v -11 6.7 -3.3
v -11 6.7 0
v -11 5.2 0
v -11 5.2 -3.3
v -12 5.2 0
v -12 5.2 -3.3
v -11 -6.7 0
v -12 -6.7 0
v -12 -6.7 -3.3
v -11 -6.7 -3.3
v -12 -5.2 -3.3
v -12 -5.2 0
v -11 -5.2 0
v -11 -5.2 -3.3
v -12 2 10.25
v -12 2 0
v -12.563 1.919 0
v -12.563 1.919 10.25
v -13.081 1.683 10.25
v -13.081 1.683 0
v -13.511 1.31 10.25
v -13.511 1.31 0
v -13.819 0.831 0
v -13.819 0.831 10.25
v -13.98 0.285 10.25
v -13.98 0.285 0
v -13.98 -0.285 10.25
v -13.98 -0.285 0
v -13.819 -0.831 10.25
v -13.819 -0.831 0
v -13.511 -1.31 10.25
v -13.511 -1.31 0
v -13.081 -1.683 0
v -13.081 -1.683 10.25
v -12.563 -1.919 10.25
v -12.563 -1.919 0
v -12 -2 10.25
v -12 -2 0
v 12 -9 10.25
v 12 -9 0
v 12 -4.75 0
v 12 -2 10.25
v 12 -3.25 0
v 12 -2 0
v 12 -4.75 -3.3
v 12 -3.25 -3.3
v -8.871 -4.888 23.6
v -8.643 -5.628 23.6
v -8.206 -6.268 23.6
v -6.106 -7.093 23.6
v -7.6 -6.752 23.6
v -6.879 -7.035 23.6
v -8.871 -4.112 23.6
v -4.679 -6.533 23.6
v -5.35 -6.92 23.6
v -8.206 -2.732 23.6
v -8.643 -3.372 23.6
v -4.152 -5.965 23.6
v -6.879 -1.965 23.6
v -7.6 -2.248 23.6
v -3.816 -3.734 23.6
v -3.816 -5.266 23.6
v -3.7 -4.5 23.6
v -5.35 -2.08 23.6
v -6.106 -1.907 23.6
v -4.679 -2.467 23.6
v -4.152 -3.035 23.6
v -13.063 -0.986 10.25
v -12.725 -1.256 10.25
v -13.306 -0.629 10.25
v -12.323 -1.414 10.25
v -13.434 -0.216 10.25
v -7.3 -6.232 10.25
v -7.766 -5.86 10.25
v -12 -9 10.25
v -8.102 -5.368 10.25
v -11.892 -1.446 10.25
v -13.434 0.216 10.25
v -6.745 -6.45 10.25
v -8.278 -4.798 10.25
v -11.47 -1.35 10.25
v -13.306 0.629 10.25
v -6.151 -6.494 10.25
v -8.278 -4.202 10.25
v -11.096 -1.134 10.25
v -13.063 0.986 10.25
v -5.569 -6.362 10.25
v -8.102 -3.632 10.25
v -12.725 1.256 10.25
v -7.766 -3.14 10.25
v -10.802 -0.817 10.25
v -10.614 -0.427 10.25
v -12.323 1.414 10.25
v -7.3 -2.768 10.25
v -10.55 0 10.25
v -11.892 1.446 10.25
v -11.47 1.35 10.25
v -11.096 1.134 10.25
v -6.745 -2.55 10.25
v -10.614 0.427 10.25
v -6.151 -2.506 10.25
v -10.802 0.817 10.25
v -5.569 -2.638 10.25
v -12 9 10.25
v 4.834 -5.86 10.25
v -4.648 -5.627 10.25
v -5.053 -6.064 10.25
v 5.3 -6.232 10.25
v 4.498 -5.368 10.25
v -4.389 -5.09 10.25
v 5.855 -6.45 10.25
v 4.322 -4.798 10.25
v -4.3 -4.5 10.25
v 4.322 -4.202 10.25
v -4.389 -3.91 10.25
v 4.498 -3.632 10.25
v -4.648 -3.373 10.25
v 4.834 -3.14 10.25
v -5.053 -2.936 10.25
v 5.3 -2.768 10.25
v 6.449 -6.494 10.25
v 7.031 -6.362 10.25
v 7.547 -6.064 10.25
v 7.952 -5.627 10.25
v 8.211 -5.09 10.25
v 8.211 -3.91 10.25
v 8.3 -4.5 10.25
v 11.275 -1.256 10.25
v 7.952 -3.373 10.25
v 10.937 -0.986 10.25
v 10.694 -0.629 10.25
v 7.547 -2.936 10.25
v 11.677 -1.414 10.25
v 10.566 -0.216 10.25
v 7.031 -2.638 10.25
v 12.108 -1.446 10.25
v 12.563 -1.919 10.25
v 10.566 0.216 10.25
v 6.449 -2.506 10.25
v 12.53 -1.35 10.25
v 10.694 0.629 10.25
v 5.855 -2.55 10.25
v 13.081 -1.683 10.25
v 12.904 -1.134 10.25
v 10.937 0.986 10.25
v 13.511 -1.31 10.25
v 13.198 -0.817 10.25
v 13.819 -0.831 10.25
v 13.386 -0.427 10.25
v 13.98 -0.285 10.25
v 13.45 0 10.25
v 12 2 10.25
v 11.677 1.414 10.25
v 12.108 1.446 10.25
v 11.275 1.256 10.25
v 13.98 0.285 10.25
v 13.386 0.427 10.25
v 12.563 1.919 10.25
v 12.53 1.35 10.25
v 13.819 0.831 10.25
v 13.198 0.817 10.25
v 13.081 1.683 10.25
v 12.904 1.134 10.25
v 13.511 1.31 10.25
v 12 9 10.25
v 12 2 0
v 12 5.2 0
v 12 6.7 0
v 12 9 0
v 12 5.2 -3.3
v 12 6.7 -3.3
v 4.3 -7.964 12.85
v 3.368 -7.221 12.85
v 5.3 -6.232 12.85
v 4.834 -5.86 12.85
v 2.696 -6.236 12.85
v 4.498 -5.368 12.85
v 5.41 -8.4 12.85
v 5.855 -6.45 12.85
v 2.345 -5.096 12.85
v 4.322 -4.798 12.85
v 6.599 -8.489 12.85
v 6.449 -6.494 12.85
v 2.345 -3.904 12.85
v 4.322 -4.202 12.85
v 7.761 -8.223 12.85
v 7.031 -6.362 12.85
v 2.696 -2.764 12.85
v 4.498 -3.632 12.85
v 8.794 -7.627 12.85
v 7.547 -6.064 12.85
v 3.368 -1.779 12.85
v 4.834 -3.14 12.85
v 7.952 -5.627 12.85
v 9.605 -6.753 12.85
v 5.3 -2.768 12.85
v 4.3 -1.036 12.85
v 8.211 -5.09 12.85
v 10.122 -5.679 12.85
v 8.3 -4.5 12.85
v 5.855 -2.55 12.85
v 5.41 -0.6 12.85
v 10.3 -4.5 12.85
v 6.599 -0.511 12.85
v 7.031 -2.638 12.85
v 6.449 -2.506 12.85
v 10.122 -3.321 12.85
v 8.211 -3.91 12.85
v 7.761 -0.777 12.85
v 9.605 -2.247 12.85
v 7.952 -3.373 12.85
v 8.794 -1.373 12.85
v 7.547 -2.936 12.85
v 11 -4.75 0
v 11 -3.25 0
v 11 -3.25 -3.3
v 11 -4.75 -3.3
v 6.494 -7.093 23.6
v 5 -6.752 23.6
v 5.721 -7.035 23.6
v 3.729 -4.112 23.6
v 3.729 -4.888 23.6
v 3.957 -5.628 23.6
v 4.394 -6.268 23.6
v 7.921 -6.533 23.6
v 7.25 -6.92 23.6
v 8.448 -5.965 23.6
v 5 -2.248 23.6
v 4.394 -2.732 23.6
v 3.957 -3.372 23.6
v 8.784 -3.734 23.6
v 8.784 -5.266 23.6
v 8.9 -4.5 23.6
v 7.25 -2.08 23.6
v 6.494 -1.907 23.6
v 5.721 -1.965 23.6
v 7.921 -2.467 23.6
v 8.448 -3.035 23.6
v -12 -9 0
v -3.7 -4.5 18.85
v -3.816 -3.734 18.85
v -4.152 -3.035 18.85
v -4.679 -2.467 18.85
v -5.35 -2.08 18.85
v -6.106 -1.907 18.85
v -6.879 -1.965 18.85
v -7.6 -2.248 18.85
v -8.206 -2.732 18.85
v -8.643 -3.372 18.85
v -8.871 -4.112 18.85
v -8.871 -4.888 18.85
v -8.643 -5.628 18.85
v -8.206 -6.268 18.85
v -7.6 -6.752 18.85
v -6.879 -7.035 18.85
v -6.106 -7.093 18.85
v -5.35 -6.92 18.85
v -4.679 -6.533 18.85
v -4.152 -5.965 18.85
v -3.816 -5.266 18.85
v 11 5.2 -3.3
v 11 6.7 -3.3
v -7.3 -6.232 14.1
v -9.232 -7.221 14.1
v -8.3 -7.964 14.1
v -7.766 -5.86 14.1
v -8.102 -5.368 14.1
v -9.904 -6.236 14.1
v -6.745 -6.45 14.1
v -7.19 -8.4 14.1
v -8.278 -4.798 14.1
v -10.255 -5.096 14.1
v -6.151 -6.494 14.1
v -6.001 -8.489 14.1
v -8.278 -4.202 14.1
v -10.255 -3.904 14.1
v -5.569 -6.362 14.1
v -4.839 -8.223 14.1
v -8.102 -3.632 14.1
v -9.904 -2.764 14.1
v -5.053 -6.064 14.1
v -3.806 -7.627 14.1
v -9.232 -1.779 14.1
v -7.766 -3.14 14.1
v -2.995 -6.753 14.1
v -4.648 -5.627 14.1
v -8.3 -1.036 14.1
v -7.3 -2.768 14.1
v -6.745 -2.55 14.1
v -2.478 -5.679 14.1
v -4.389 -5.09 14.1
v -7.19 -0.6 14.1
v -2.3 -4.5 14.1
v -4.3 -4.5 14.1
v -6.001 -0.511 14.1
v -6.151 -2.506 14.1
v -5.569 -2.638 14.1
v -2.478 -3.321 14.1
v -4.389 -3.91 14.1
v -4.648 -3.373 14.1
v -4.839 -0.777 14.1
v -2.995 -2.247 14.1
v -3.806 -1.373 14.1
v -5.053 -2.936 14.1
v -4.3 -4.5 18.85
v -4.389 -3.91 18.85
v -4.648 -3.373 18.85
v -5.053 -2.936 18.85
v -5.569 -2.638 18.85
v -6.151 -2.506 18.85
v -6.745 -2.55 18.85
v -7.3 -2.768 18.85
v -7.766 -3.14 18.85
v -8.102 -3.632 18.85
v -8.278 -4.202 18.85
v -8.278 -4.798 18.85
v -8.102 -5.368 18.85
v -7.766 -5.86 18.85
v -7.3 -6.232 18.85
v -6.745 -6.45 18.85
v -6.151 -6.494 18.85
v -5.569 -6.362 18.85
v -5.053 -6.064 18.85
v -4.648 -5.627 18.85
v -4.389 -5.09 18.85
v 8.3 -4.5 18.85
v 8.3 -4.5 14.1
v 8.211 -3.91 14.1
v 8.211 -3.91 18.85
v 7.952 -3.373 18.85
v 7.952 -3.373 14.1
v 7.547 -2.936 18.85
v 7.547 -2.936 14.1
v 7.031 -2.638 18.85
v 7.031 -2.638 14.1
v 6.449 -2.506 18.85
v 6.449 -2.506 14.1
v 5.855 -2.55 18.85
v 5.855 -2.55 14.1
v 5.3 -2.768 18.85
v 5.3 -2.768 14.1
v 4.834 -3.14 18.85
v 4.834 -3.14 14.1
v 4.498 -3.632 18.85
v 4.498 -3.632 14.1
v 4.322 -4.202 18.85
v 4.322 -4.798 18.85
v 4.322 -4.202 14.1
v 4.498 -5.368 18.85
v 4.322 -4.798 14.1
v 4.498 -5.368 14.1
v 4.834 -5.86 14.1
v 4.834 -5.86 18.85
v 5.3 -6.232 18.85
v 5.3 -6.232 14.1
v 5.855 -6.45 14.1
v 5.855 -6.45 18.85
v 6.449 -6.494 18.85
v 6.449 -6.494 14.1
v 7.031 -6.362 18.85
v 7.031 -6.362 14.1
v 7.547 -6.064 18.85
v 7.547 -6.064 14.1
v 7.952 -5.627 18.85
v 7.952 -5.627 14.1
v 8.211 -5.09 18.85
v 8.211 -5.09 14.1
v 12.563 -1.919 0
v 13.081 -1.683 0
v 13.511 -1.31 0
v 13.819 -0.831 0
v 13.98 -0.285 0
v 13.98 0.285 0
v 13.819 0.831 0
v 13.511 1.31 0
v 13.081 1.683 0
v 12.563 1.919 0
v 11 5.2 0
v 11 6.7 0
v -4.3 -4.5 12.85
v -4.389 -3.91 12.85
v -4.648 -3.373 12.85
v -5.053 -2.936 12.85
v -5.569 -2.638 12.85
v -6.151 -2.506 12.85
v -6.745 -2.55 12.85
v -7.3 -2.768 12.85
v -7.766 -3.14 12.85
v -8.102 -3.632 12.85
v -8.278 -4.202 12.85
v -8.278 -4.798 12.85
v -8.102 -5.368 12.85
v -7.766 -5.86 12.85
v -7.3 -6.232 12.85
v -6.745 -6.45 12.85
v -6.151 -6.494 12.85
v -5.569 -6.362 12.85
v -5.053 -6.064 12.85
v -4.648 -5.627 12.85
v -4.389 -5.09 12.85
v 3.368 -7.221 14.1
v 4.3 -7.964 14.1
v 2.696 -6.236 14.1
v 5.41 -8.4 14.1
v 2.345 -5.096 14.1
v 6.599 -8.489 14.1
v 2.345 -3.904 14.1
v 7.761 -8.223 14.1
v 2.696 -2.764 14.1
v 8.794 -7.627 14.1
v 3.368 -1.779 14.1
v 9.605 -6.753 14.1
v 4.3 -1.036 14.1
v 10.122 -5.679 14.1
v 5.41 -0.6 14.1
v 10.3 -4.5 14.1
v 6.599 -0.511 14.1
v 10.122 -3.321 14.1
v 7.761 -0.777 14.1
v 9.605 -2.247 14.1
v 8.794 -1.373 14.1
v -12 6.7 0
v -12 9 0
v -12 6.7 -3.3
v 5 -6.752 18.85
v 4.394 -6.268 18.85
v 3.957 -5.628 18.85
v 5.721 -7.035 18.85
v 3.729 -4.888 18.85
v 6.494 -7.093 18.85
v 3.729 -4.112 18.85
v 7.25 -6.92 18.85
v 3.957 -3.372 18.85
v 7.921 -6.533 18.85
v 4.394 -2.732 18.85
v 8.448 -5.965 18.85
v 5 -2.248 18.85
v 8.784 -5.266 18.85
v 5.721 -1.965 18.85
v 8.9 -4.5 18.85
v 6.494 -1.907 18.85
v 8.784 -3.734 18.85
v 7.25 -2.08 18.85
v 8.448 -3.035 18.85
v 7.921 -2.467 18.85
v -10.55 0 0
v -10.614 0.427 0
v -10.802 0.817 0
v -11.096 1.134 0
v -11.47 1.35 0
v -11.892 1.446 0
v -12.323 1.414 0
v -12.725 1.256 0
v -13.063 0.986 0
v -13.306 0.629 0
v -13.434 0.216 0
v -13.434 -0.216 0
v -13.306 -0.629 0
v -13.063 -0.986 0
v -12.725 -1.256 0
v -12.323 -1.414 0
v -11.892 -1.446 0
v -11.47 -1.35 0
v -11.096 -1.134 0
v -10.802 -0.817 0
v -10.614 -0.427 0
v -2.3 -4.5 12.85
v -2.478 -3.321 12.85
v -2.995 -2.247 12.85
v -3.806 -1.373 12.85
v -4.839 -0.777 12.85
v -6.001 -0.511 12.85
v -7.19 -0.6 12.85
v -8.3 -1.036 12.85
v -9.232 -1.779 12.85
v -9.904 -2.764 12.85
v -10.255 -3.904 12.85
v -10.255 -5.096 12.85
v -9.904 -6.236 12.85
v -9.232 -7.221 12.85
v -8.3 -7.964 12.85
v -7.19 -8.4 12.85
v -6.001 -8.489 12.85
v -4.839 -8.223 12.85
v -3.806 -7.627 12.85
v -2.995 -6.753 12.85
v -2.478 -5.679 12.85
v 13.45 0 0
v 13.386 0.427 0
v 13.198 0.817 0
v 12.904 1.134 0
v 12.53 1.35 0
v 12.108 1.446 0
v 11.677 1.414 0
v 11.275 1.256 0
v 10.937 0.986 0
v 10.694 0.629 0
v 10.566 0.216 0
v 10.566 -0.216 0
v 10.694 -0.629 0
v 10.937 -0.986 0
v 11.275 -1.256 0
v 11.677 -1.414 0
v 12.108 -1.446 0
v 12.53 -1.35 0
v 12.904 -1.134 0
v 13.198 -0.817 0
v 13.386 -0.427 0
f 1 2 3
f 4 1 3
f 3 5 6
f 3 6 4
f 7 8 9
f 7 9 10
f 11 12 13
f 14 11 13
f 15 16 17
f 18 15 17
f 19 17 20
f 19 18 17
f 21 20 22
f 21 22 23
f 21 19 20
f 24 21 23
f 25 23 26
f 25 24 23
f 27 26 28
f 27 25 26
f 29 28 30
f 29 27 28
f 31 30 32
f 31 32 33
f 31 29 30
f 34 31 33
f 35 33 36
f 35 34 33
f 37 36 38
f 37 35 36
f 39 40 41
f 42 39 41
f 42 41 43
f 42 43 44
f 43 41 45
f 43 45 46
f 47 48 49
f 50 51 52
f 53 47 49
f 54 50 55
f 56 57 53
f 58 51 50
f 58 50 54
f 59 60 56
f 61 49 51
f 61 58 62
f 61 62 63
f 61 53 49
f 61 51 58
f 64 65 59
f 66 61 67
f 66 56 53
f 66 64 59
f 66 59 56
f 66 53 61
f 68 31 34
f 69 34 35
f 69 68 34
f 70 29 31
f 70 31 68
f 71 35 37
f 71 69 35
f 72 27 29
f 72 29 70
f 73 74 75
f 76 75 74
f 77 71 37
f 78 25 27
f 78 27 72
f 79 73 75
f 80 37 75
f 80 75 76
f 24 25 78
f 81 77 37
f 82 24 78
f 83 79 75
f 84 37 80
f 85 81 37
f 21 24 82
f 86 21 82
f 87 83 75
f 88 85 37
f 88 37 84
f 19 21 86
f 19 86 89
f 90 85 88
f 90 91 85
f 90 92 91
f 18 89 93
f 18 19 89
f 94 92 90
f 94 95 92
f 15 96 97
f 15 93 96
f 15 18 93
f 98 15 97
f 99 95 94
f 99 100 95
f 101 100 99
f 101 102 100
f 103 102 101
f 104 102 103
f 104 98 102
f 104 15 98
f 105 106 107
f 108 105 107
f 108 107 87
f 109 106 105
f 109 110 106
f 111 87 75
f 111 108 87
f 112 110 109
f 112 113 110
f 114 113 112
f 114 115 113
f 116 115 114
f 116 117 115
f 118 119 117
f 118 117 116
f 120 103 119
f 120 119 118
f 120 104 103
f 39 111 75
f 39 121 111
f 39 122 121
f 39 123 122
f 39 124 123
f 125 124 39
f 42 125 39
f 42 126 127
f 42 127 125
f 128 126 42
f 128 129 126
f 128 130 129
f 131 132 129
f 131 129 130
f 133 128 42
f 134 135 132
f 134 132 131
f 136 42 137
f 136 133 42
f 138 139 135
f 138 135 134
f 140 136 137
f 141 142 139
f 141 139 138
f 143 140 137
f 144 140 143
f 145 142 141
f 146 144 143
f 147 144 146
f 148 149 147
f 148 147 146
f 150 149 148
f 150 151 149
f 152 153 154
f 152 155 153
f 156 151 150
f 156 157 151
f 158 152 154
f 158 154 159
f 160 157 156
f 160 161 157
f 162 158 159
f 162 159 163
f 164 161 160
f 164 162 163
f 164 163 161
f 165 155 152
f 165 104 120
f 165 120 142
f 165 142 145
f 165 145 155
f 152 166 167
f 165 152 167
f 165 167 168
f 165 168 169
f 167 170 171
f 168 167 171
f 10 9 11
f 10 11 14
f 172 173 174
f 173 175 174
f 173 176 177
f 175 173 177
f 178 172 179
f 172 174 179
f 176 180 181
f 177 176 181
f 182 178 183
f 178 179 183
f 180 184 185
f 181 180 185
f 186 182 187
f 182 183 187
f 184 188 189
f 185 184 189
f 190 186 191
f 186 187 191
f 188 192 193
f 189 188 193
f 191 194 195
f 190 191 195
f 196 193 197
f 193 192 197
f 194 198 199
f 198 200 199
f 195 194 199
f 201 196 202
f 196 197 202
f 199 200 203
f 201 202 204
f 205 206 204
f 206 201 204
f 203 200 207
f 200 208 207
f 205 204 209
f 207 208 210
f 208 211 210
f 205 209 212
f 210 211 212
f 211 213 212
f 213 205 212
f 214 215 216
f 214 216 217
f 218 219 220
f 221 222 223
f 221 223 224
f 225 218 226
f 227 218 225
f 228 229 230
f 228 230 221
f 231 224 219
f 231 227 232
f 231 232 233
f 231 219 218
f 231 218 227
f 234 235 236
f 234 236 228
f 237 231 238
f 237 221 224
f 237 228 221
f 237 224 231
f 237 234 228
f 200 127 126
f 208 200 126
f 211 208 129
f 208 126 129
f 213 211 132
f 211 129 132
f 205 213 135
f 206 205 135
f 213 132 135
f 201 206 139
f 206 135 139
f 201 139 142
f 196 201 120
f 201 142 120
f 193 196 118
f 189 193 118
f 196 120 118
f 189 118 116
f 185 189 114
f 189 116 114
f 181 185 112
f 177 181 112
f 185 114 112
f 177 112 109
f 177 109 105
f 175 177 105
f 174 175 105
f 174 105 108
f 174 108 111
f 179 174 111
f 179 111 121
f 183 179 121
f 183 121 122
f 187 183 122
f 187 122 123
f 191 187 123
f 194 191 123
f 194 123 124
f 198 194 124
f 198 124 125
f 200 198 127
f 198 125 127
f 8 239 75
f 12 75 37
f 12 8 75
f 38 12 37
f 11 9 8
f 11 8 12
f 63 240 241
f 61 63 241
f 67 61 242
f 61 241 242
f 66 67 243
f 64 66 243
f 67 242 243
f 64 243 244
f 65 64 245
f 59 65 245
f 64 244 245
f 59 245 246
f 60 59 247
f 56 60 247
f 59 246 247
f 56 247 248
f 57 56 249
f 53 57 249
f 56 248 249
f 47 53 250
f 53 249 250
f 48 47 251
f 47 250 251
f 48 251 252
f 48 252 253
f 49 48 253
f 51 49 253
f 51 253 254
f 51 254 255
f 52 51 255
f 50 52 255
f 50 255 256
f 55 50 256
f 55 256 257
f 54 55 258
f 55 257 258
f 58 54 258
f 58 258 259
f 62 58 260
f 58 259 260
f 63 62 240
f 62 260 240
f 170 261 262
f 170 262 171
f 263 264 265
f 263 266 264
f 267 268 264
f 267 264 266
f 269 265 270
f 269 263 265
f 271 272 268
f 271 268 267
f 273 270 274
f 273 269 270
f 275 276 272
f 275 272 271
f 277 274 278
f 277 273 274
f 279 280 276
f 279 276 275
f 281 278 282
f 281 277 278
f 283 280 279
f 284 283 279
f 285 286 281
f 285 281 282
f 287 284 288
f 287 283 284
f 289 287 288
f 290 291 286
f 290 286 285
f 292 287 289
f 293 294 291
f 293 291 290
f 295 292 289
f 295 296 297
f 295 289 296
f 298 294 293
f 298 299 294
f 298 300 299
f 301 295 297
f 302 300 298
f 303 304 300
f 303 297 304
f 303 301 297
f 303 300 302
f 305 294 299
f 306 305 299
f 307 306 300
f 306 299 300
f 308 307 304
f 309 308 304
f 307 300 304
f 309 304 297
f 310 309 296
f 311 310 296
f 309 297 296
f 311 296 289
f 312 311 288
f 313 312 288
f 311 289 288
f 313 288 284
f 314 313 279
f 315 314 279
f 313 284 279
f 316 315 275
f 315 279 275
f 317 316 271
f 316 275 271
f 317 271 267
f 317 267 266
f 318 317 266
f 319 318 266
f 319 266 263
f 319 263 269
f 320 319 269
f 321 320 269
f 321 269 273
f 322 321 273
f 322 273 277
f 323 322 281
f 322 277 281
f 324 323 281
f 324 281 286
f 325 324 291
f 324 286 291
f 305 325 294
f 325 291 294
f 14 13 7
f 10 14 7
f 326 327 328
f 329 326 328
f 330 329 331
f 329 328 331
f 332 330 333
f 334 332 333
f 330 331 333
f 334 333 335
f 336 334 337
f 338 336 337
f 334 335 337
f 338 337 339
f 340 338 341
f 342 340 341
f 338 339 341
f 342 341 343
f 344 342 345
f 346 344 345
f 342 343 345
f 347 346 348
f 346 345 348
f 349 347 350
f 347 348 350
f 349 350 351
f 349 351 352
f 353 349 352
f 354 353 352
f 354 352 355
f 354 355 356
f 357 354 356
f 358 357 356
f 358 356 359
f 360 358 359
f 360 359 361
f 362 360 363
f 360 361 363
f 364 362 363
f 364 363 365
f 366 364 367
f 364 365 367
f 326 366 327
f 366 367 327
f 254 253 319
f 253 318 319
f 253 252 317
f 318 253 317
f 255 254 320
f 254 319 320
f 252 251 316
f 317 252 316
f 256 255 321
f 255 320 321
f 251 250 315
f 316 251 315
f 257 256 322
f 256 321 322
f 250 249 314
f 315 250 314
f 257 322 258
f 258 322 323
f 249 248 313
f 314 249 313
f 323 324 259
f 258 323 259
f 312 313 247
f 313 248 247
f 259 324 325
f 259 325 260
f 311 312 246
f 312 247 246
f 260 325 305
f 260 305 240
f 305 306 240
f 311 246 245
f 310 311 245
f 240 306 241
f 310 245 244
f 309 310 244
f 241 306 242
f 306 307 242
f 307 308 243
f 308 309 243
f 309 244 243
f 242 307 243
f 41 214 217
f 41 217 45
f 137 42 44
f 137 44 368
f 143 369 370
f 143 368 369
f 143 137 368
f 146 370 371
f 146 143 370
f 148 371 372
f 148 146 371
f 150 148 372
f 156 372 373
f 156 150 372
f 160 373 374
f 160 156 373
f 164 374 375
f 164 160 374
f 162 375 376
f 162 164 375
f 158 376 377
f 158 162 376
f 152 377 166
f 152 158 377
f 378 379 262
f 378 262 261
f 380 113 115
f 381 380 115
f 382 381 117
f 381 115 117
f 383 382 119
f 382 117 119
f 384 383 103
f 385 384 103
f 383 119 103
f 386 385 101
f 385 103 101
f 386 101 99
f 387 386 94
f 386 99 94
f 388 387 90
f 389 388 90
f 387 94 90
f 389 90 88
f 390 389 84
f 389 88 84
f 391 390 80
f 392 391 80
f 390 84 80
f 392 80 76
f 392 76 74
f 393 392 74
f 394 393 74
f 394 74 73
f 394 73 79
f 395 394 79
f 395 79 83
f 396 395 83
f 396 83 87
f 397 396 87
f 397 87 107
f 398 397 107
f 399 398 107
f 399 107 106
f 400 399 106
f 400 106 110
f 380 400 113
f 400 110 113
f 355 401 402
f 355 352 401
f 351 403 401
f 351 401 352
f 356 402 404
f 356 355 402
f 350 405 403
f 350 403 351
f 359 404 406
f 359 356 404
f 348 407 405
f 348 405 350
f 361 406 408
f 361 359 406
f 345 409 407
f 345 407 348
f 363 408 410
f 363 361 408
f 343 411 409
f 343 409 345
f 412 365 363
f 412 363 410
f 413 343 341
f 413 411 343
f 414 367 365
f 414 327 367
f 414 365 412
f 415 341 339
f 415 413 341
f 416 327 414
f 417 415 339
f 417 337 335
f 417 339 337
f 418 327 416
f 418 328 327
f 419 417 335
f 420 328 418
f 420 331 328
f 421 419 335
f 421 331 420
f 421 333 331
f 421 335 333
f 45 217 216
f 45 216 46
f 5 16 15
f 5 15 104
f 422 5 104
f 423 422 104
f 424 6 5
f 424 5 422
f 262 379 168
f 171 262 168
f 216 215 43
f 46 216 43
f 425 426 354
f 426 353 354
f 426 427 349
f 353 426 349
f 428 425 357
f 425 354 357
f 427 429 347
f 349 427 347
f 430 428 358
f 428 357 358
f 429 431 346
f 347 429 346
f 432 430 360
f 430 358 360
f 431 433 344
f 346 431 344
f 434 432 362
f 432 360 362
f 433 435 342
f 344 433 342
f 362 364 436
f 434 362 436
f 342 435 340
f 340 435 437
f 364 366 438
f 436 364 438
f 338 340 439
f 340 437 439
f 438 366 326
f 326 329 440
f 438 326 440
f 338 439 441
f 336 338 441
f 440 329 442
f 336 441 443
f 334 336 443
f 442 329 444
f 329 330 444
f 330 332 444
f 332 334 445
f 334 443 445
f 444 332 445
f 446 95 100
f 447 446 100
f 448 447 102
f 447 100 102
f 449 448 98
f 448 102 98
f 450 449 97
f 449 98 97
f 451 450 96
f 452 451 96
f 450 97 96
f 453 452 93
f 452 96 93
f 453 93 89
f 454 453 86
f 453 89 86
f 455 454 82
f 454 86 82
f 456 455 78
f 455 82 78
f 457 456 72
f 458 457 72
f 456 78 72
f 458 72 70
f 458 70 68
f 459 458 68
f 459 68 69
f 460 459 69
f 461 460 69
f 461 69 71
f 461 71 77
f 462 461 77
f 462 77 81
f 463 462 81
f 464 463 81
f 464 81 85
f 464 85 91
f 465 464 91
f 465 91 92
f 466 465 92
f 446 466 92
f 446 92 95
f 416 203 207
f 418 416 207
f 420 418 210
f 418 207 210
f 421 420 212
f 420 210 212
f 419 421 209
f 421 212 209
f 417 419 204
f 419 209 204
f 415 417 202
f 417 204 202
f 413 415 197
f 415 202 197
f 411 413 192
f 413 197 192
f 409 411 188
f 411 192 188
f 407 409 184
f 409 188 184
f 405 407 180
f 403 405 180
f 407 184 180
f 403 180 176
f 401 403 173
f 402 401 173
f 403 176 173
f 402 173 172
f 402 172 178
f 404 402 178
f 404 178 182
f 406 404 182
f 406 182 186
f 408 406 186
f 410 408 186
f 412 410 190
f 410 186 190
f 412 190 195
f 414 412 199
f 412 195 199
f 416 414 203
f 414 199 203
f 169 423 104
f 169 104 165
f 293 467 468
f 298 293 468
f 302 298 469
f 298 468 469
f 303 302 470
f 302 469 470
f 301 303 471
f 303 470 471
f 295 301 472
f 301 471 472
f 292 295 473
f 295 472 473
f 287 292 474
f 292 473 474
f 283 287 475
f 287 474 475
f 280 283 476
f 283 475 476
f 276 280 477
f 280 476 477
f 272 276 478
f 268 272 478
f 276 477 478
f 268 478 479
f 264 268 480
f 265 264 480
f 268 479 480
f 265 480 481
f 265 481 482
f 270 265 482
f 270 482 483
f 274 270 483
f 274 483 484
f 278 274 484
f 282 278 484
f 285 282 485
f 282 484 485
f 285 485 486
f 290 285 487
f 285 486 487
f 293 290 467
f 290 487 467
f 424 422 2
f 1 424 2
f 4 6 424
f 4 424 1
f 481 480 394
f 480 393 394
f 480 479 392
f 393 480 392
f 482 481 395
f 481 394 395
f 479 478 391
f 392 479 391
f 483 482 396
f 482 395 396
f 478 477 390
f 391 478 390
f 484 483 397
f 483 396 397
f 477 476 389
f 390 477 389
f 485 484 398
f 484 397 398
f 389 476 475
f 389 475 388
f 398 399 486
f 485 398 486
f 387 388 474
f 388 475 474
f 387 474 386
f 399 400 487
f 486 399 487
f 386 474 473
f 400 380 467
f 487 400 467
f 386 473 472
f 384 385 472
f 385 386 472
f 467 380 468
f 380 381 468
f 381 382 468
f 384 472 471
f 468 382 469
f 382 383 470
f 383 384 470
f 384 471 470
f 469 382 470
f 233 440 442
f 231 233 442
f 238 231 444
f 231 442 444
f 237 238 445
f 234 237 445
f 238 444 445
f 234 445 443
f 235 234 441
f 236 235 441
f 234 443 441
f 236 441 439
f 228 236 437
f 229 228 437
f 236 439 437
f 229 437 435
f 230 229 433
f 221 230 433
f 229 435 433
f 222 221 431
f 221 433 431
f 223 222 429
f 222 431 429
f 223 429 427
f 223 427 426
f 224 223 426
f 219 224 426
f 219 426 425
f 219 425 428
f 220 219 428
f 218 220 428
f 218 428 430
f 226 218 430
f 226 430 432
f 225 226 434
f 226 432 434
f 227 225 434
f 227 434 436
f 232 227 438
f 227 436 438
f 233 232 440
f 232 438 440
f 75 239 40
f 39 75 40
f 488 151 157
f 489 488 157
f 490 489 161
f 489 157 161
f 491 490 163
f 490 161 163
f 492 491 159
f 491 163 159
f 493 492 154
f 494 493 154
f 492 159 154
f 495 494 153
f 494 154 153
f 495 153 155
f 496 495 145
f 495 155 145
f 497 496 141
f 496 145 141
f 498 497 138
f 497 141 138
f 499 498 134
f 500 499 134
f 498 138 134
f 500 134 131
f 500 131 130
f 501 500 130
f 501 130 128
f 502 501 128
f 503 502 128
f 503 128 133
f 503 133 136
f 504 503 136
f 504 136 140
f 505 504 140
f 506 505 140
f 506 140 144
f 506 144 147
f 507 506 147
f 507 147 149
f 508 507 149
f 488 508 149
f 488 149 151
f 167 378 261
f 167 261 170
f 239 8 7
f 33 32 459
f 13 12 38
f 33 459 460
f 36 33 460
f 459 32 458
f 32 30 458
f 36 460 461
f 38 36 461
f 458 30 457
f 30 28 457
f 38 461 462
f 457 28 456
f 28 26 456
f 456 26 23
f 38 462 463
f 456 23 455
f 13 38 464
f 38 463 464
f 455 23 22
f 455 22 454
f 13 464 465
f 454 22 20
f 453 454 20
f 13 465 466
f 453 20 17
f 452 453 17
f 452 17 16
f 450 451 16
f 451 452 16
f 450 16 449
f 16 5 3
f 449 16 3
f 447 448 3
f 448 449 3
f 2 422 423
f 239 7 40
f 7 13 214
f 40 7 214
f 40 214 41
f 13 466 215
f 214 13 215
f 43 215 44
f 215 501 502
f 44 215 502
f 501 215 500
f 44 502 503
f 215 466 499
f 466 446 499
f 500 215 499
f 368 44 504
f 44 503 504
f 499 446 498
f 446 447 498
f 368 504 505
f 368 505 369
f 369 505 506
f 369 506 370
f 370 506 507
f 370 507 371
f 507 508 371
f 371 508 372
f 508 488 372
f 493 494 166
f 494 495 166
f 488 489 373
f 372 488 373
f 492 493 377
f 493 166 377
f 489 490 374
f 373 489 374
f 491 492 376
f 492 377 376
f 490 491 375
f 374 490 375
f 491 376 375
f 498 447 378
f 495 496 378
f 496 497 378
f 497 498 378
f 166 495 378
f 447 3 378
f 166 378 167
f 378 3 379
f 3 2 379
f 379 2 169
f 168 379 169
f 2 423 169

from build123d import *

# Parameters (mm, degrees)
F0_W      = 24
F0_H      = 18
F1_DEPTH  = 10.25
F2_R      = 2
F3_DEPTH  = 2.6
F4_R      = 4
F4_R_2    = 2
F5_DEPTH  = 1.25
F6_R      = 2
F7_DEPTH  = 4.75
F8_R      = 2.6
F9_DEPTH  = 4.75
F10_R     = 2
F11_DEPTH = 10.25
F12_R     = 1.45
F13_DEPTH = 25
F14_W     = 1
F14_H     = 1.5
F15_DEPTH = 3.3


with BuildPart() as f1:
    # F0 (on Top) → F1 (new body)
    with BuildSketch(Plane.XY):
        Rectangle(F0_W, F0_H)
    extrude(amount=F1_DEPTH)

    # F2 (on face) → F3 (join)
    with BuildSketch(Plane.XY.offset(10.25)):
        with Locations((-6.3, -4.5)):
            Circle(F2_R)
        with Locations((6.3, -4.5)):
            Circle(F2_R)
    extrude(amount=F3_DEPTH)

    # F4 (on face) → F5 (join)
    with BuildSketch(Plane.XY.offset(12.85)):
        with Locations((-6.3, -4.5)):
            Circle(F4_R)
        with Locations((-6.3, -4.5)):
            Circle(F4_R_2, mode=Mode.SUBTRACT)
        with Locations((6.3, -4.5)):
            Circle(F4_R)
        with Locations((-6.3, -4.5)):
            Circle(F4_R_2)
    extrude(amount=F5_DEPTH)

    # F6 (on face) → F7 (join)
    with BuildSketch(Plane.XY.offset(14.1)):
        with Locations((6.3, -4.5)):
            Circle(F6_R)
        with Locations((-6.3, -4.5)):
            Circle(F6_R)
    extrude(amount=F7_DEPTH)

    # F8 (on face) → F9 (join)
    with BuildSketch(Plane.XY.offset(18.85)):
        with Locations((-6.3, -4.5)):
            Circle(F8_R)
        with Locations((6.3, -4.5)):
            Circle(F8_R)
    extrude(amount=F9_DEPTH)

    # F10 (on face) → F11 (join)
    with BuildSketch(Plane.XY.offset(10.25)):
        with Locations((-12, 0)):
            Circle(F10_R)
        with Locations((12, 0)):
            Circle(F10_R)
    extrude(amount=-F11_DEPTH)

    # F12 (on face) → F13 (cut)
    with BuildSketch(Plane.XY.offset(10.25)):
        with Locations((-12, 0)):
            Circle(F12_R)
        with Locations((12, 0)):
            Circle(F12_R)
    extrude(amount=-F13_DEPTH, mode=Mode.SUBTRACT)

    # F14 (on face) → F15 (join)
    with BuildSketch(Plane(origin=(0, 0, 0), x_dir=(1, 0, 0), z_dir=(0, 0, -1))):
        with Locations((-11.5, 5.95)):
            Rectangle(F14_W, F14_H)
        with Locations((-11.5, -5.95)):
            Rectangle(F14_W, F14_H)
        with Locations((11.5, -5.95)):
            Rectangle(F14_W, F14_H)
        with Locations((11.5, 4)):
            Rectangle(F14_W, F14_H)
    extrude(amount=F15_DEPTH)


solid = f1.part
